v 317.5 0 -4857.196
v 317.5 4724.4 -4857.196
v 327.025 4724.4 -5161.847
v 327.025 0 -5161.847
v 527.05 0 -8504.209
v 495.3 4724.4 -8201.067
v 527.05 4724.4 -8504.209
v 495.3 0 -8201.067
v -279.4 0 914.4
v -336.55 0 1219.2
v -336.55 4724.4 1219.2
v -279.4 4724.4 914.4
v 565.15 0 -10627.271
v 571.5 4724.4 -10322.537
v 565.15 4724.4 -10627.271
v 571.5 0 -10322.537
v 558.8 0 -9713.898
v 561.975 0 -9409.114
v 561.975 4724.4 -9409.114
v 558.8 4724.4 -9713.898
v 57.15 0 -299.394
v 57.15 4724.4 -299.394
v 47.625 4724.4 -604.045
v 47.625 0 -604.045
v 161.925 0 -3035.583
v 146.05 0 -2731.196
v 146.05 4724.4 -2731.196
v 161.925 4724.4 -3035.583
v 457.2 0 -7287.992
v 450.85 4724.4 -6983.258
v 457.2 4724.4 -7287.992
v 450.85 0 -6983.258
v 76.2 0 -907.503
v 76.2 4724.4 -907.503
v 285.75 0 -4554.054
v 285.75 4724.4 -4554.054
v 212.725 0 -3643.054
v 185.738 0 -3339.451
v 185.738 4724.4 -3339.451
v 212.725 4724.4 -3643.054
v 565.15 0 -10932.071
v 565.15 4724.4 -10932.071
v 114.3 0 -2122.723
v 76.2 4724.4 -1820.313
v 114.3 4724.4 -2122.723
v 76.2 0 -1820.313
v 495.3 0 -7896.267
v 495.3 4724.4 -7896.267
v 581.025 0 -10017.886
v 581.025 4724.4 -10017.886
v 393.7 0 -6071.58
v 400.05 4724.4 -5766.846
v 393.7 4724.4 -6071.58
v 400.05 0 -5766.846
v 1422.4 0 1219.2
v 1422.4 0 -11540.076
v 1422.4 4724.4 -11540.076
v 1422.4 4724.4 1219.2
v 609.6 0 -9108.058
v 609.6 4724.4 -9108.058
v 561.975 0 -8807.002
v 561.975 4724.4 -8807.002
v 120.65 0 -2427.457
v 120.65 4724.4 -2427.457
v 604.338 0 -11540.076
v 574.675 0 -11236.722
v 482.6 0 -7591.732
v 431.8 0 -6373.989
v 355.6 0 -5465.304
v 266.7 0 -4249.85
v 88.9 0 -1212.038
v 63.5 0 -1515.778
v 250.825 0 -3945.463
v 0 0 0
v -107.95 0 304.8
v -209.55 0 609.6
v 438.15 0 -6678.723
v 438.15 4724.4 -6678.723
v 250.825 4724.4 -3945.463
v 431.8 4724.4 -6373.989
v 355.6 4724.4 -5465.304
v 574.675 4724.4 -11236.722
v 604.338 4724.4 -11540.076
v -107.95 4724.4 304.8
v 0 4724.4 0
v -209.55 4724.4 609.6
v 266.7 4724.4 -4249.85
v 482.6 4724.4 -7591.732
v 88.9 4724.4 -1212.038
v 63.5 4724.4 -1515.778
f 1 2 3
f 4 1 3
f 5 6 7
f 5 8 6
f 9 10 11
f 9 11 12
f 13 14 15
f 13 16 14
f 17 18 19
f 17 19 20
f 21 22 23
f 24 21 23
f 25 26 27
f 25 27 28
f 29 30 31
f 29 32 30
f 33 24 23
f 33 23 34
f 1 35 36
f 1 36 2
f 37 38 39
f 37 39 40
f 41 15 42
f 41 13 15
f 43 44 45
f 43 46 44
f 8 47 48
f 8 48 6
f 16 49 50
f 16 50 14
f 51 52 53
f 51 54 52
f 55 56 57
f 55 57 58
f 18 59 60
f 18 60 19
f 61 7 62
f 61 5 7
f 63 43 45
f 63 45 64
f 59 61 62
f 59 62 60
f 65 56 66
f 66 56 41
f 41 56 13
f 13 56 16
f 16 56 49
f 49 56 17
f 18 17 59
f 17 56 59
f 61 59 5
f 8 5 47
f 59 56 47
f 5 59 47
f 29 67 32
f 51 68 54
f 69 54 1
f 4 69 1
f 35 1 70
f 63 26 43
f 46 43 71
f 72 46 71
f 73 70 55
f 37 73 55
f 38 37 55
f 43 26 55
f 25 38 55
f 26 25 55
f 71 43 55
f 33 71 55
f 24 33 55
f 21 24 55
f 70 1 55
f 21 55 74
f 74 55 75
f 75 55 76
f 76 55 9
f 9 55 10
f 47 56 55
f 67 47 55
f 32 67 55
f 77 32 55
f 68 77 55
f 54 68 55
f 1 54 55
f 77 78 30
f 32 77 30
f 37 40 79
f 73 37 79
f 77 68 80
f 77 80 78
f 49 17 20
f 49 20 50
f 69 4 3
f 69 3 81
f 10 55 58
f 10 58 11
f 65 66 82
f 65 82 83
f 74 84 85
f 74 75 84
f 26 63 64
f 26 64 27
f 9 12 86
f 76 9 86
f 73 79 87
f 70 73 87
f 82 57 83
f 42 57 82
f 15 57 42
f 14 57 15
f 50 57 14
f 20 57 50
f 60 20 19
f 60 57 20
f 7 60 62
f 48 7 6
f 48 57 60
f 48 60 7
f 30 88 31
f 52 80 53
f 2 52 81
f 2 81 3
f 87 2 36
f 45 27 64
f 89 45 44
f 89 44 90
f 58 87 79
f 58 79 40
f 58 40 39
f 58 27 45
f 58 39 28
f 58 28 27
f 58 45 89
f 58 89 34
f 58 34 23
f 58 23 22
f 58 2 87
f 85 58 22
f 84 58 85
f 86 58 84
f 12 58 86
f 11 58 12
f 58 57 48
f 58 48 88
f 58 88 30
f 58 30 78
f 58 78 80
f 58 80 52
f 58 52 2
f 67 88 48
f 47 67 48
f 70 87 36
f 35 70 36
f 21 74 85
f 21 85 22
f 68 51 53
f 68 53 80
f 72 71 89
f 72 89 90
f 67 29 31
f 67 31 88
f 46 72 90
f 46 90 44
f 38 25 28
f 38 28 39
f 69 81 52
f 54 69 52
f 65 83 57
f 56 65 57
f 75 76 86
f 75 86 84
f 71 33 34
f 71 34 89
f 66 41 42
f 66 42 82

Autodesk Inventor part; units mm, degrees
ref_plane "XZ Plane" through (0, 0, 0) normal (0, 1, 0) x (-1, 0, 0)
sketch "Sketch1" plane through (0, 0, 0) normal (0, 1, 0) x (-1, 0, 0)
  line L0 (368.3, 1219.2) -> (368.3, -11582.4)
  line L1 (368.3, 1219.2) -> (336.55, 1219.2)
  line L2 (336.55, 1219.2) -> (279.4, 914.4)
  line L3 (279.4, 914.4) -> (209.55, 609.6)
  line L4 (209.55, 609.6) -> (107.95, 304.8)
  line L5 (107.95, 304.8) -> (0, 0)
  line L6 (0, 0) -> (-57.15, -299.3943)
  line L7 (-57.15, -299.3943) -> (-47.625, -604.0454)
  line L8 (-47.625, -604.0454) -> (-76.2, -907.503)
  line L9 (-76.2, -907.503) -> (-88.9, -1212.0383)
  line L10 (-88.9, -1212.0383) -> (-63.5, -1515.7781)
  line L11 (-63.5, -1515.7781) -> (-76.2, -1820.3134)
  line L12 (-76.2, -1820.3134) -> (-114.3, -2122.7228)
  line L13 (-114.3, -2122.7228) -> (-120.65, -2427.4566)
  line L14 (-120.65, -2427.4566) -> (-146.05, -2731.1964)
  line L15 (-146.05, -2731.1964) -> (-161.925, -3035.5828)
  line L16 (-161.925, -3035.5828) -> (-185.7375, -3339.4512)
  line L17 (-185.7375, -3339.4512) -> (-212.725, -3643.054)
  line L18 (-212.725, -3643.054) -> (-250.825, -3945.4634)
  line L19 (-250.825, -3945.4634) -> (-266.7, -4249.8497)
  line L20 (-266.7, -4249.8497) -> (-285.75, -4554.0538)
  line L21 (-285.75, -4554.0538) -> (-317.5, -4857.1957)
  line L22 (-317.5, -4857.1957) -> (-327.025, -5161.8468)
  line L23 (-327.025, -5161.8468) -> (-355.6, -5465.3044)
  line L24 (-355.6, -5465.3044) -> (-400.05, -5766.8458)
  line L25 (-400.05, -5766.8458) -> (-393.7, -6071.5797)
  line L26 (-393.7, -6071.5797) -> (-431.8, -6373.9891)
  line L27 (-431.8, -6373.9891) -> (-438.15, -6678.7229)
  line L28 (-438.15, -6678.7229) -> (-450.85, -6983.2582)
  line L29 (-450.85, -6983.2582) -> (-457.2, -7287.9921)
  line L30 (-457.2, -7287.9921) -> (-482.6, -7591.7319)
  line L31 (-482.6, -7591.7319) -> (-495.3, -7896.2672)
  line L32 (-495.3, -7896.2672) -> (-495.3, -8201.0672)
  line L33 (-495.3, -8201.0672) -> (-527.05, -8504.209)
  line L34 (-527.05, -8504.209) -> (-561.975, -8807.0015)
  line L35 (-561.975, -8807.0015) -> (-609.6, -9108.0578)
  line L36 (-609.6, -9108.0578) -> (-561.975, -9409.1141)
  line L37 (-561.975, -9409.1141) -> (-558.8, -9713.8976)
  line L38 (-558.8, -9713.8976) -> (-581.025, -10017.8862)
  line L39 (-581.025, -10017.8862) -> (-571.5, -10322.5373)
  line L40 (-571.5, -10322.5373) -> (-565.15, -10627.2712)
  line L41 (-565.15, -10627.2712) -> (-565.15, -10932.0712)
  line L42 (-565.15, -10932.0712) -> (-574.675, -11236.7223)
  line L43 (-574.675, -11236.7223) -> (-604.3377, -11540.0755)
  line L44 (-1422.4, 1219.2) -> (336.55, 1219.2)
  line L45 (-604.3377, -11540.0755) -> (-1422.4, -11540.0755)
  line L46 (-1422.4, -11540.0755) -> (-1422.4, 1219.2)
  point P0 (368.3, -5181.6)
  dimension "d4" = 1219.2
  dimension "d5" = 11582.4
  dimension "d6" = 368.3
  dimension "d8" = 31.75
  dimension "d10" = 304.8
  dimension "d14" = 88.9
  dimension "d15" = 304.8
  dimension "d16" = 304.8
  dimension "d17" = 260.35
  dimension "d18" = 158.75
  dimension "d20" = 304.8
  dimension "d21" = 425.45
  dimension "d22" = 304.8
  dimension "d23" = 415.925
  dimension "d24" = 304.8
  dimension "d25" = 444.5
  dimension "d26" = 304.8
  dimension "d27" = 457.2
  dimension "d28" = 304.8
  dimension "d29" = 431.8
  dimension "d30" = 304.8
  dimension "d31" = 444.5
  dimension "d32" = 304.8
  dimension "d33" = 482.6
  dimension "d34" = 304.8
  dimension "d35" = 488.95
  dimension "d36" = 304.8
  dimension "d37" = 514.35
  dimension "d39" = 304.8
  dimension "d40" = 530.225
  dimension "d41" = 304.8
  dimension "d42" = 554.0375
  dimension "d43" = 304.8
  dimension "d44" = 581.025
  dimension "d45" = 304.8
  dimension "d46" = 619.125
  dimension "d47" = 304.8
  dimension "d48" = 635
  dimension "d49" = 304.8
  dimension "d50" = 654.05
  dimension "d51" = 304.8
  dimension "d52" = 685.8
  dimension "d53" = 304.8
  dimension "d54" = 695.325
  dimension "d55" = 304.8
  dimension "d56" = 723.9
  dimension "d57" = 304.8
  dimension "d58" = 768.35
  dimension "d59" = 304.8
  dimension "d60" = 762
  dimension "d61" = 304.8
  dimension "d62" = 800.1
  dimension "d63" = 304.8
  dimension "d64" = 806.45
  dimension "d65" = 304.8
  dimension "d66" = 819.15
  dimension "d67" = 304.8
  dimension "d68" = 825.5
  dimension "d69" = 304.8
  dimension "d70" = 850.9
  dimension "d71" = 304.8
  dimension "d72" = 863.6
  dimension "d73" = 304.8
  dimension "d74" = 863.6
extrude "Extrusion1" add sketch "Sketch1" along normal blind 4724.4
ref_plane "Work Plane1" through (0, 0, 0) normal (1, 0, 0) x (0, 1, 0)
ref_plane "Work Plane2" through (88.9, 4724.4, -1212.0383) normal (1, 0, 0) x (0, 1, 0)
properties part number "Elevation_Profile_Extending_NW_From_N_Edge_Of_Foundation_Where_Foundation_Meets_Ground"
